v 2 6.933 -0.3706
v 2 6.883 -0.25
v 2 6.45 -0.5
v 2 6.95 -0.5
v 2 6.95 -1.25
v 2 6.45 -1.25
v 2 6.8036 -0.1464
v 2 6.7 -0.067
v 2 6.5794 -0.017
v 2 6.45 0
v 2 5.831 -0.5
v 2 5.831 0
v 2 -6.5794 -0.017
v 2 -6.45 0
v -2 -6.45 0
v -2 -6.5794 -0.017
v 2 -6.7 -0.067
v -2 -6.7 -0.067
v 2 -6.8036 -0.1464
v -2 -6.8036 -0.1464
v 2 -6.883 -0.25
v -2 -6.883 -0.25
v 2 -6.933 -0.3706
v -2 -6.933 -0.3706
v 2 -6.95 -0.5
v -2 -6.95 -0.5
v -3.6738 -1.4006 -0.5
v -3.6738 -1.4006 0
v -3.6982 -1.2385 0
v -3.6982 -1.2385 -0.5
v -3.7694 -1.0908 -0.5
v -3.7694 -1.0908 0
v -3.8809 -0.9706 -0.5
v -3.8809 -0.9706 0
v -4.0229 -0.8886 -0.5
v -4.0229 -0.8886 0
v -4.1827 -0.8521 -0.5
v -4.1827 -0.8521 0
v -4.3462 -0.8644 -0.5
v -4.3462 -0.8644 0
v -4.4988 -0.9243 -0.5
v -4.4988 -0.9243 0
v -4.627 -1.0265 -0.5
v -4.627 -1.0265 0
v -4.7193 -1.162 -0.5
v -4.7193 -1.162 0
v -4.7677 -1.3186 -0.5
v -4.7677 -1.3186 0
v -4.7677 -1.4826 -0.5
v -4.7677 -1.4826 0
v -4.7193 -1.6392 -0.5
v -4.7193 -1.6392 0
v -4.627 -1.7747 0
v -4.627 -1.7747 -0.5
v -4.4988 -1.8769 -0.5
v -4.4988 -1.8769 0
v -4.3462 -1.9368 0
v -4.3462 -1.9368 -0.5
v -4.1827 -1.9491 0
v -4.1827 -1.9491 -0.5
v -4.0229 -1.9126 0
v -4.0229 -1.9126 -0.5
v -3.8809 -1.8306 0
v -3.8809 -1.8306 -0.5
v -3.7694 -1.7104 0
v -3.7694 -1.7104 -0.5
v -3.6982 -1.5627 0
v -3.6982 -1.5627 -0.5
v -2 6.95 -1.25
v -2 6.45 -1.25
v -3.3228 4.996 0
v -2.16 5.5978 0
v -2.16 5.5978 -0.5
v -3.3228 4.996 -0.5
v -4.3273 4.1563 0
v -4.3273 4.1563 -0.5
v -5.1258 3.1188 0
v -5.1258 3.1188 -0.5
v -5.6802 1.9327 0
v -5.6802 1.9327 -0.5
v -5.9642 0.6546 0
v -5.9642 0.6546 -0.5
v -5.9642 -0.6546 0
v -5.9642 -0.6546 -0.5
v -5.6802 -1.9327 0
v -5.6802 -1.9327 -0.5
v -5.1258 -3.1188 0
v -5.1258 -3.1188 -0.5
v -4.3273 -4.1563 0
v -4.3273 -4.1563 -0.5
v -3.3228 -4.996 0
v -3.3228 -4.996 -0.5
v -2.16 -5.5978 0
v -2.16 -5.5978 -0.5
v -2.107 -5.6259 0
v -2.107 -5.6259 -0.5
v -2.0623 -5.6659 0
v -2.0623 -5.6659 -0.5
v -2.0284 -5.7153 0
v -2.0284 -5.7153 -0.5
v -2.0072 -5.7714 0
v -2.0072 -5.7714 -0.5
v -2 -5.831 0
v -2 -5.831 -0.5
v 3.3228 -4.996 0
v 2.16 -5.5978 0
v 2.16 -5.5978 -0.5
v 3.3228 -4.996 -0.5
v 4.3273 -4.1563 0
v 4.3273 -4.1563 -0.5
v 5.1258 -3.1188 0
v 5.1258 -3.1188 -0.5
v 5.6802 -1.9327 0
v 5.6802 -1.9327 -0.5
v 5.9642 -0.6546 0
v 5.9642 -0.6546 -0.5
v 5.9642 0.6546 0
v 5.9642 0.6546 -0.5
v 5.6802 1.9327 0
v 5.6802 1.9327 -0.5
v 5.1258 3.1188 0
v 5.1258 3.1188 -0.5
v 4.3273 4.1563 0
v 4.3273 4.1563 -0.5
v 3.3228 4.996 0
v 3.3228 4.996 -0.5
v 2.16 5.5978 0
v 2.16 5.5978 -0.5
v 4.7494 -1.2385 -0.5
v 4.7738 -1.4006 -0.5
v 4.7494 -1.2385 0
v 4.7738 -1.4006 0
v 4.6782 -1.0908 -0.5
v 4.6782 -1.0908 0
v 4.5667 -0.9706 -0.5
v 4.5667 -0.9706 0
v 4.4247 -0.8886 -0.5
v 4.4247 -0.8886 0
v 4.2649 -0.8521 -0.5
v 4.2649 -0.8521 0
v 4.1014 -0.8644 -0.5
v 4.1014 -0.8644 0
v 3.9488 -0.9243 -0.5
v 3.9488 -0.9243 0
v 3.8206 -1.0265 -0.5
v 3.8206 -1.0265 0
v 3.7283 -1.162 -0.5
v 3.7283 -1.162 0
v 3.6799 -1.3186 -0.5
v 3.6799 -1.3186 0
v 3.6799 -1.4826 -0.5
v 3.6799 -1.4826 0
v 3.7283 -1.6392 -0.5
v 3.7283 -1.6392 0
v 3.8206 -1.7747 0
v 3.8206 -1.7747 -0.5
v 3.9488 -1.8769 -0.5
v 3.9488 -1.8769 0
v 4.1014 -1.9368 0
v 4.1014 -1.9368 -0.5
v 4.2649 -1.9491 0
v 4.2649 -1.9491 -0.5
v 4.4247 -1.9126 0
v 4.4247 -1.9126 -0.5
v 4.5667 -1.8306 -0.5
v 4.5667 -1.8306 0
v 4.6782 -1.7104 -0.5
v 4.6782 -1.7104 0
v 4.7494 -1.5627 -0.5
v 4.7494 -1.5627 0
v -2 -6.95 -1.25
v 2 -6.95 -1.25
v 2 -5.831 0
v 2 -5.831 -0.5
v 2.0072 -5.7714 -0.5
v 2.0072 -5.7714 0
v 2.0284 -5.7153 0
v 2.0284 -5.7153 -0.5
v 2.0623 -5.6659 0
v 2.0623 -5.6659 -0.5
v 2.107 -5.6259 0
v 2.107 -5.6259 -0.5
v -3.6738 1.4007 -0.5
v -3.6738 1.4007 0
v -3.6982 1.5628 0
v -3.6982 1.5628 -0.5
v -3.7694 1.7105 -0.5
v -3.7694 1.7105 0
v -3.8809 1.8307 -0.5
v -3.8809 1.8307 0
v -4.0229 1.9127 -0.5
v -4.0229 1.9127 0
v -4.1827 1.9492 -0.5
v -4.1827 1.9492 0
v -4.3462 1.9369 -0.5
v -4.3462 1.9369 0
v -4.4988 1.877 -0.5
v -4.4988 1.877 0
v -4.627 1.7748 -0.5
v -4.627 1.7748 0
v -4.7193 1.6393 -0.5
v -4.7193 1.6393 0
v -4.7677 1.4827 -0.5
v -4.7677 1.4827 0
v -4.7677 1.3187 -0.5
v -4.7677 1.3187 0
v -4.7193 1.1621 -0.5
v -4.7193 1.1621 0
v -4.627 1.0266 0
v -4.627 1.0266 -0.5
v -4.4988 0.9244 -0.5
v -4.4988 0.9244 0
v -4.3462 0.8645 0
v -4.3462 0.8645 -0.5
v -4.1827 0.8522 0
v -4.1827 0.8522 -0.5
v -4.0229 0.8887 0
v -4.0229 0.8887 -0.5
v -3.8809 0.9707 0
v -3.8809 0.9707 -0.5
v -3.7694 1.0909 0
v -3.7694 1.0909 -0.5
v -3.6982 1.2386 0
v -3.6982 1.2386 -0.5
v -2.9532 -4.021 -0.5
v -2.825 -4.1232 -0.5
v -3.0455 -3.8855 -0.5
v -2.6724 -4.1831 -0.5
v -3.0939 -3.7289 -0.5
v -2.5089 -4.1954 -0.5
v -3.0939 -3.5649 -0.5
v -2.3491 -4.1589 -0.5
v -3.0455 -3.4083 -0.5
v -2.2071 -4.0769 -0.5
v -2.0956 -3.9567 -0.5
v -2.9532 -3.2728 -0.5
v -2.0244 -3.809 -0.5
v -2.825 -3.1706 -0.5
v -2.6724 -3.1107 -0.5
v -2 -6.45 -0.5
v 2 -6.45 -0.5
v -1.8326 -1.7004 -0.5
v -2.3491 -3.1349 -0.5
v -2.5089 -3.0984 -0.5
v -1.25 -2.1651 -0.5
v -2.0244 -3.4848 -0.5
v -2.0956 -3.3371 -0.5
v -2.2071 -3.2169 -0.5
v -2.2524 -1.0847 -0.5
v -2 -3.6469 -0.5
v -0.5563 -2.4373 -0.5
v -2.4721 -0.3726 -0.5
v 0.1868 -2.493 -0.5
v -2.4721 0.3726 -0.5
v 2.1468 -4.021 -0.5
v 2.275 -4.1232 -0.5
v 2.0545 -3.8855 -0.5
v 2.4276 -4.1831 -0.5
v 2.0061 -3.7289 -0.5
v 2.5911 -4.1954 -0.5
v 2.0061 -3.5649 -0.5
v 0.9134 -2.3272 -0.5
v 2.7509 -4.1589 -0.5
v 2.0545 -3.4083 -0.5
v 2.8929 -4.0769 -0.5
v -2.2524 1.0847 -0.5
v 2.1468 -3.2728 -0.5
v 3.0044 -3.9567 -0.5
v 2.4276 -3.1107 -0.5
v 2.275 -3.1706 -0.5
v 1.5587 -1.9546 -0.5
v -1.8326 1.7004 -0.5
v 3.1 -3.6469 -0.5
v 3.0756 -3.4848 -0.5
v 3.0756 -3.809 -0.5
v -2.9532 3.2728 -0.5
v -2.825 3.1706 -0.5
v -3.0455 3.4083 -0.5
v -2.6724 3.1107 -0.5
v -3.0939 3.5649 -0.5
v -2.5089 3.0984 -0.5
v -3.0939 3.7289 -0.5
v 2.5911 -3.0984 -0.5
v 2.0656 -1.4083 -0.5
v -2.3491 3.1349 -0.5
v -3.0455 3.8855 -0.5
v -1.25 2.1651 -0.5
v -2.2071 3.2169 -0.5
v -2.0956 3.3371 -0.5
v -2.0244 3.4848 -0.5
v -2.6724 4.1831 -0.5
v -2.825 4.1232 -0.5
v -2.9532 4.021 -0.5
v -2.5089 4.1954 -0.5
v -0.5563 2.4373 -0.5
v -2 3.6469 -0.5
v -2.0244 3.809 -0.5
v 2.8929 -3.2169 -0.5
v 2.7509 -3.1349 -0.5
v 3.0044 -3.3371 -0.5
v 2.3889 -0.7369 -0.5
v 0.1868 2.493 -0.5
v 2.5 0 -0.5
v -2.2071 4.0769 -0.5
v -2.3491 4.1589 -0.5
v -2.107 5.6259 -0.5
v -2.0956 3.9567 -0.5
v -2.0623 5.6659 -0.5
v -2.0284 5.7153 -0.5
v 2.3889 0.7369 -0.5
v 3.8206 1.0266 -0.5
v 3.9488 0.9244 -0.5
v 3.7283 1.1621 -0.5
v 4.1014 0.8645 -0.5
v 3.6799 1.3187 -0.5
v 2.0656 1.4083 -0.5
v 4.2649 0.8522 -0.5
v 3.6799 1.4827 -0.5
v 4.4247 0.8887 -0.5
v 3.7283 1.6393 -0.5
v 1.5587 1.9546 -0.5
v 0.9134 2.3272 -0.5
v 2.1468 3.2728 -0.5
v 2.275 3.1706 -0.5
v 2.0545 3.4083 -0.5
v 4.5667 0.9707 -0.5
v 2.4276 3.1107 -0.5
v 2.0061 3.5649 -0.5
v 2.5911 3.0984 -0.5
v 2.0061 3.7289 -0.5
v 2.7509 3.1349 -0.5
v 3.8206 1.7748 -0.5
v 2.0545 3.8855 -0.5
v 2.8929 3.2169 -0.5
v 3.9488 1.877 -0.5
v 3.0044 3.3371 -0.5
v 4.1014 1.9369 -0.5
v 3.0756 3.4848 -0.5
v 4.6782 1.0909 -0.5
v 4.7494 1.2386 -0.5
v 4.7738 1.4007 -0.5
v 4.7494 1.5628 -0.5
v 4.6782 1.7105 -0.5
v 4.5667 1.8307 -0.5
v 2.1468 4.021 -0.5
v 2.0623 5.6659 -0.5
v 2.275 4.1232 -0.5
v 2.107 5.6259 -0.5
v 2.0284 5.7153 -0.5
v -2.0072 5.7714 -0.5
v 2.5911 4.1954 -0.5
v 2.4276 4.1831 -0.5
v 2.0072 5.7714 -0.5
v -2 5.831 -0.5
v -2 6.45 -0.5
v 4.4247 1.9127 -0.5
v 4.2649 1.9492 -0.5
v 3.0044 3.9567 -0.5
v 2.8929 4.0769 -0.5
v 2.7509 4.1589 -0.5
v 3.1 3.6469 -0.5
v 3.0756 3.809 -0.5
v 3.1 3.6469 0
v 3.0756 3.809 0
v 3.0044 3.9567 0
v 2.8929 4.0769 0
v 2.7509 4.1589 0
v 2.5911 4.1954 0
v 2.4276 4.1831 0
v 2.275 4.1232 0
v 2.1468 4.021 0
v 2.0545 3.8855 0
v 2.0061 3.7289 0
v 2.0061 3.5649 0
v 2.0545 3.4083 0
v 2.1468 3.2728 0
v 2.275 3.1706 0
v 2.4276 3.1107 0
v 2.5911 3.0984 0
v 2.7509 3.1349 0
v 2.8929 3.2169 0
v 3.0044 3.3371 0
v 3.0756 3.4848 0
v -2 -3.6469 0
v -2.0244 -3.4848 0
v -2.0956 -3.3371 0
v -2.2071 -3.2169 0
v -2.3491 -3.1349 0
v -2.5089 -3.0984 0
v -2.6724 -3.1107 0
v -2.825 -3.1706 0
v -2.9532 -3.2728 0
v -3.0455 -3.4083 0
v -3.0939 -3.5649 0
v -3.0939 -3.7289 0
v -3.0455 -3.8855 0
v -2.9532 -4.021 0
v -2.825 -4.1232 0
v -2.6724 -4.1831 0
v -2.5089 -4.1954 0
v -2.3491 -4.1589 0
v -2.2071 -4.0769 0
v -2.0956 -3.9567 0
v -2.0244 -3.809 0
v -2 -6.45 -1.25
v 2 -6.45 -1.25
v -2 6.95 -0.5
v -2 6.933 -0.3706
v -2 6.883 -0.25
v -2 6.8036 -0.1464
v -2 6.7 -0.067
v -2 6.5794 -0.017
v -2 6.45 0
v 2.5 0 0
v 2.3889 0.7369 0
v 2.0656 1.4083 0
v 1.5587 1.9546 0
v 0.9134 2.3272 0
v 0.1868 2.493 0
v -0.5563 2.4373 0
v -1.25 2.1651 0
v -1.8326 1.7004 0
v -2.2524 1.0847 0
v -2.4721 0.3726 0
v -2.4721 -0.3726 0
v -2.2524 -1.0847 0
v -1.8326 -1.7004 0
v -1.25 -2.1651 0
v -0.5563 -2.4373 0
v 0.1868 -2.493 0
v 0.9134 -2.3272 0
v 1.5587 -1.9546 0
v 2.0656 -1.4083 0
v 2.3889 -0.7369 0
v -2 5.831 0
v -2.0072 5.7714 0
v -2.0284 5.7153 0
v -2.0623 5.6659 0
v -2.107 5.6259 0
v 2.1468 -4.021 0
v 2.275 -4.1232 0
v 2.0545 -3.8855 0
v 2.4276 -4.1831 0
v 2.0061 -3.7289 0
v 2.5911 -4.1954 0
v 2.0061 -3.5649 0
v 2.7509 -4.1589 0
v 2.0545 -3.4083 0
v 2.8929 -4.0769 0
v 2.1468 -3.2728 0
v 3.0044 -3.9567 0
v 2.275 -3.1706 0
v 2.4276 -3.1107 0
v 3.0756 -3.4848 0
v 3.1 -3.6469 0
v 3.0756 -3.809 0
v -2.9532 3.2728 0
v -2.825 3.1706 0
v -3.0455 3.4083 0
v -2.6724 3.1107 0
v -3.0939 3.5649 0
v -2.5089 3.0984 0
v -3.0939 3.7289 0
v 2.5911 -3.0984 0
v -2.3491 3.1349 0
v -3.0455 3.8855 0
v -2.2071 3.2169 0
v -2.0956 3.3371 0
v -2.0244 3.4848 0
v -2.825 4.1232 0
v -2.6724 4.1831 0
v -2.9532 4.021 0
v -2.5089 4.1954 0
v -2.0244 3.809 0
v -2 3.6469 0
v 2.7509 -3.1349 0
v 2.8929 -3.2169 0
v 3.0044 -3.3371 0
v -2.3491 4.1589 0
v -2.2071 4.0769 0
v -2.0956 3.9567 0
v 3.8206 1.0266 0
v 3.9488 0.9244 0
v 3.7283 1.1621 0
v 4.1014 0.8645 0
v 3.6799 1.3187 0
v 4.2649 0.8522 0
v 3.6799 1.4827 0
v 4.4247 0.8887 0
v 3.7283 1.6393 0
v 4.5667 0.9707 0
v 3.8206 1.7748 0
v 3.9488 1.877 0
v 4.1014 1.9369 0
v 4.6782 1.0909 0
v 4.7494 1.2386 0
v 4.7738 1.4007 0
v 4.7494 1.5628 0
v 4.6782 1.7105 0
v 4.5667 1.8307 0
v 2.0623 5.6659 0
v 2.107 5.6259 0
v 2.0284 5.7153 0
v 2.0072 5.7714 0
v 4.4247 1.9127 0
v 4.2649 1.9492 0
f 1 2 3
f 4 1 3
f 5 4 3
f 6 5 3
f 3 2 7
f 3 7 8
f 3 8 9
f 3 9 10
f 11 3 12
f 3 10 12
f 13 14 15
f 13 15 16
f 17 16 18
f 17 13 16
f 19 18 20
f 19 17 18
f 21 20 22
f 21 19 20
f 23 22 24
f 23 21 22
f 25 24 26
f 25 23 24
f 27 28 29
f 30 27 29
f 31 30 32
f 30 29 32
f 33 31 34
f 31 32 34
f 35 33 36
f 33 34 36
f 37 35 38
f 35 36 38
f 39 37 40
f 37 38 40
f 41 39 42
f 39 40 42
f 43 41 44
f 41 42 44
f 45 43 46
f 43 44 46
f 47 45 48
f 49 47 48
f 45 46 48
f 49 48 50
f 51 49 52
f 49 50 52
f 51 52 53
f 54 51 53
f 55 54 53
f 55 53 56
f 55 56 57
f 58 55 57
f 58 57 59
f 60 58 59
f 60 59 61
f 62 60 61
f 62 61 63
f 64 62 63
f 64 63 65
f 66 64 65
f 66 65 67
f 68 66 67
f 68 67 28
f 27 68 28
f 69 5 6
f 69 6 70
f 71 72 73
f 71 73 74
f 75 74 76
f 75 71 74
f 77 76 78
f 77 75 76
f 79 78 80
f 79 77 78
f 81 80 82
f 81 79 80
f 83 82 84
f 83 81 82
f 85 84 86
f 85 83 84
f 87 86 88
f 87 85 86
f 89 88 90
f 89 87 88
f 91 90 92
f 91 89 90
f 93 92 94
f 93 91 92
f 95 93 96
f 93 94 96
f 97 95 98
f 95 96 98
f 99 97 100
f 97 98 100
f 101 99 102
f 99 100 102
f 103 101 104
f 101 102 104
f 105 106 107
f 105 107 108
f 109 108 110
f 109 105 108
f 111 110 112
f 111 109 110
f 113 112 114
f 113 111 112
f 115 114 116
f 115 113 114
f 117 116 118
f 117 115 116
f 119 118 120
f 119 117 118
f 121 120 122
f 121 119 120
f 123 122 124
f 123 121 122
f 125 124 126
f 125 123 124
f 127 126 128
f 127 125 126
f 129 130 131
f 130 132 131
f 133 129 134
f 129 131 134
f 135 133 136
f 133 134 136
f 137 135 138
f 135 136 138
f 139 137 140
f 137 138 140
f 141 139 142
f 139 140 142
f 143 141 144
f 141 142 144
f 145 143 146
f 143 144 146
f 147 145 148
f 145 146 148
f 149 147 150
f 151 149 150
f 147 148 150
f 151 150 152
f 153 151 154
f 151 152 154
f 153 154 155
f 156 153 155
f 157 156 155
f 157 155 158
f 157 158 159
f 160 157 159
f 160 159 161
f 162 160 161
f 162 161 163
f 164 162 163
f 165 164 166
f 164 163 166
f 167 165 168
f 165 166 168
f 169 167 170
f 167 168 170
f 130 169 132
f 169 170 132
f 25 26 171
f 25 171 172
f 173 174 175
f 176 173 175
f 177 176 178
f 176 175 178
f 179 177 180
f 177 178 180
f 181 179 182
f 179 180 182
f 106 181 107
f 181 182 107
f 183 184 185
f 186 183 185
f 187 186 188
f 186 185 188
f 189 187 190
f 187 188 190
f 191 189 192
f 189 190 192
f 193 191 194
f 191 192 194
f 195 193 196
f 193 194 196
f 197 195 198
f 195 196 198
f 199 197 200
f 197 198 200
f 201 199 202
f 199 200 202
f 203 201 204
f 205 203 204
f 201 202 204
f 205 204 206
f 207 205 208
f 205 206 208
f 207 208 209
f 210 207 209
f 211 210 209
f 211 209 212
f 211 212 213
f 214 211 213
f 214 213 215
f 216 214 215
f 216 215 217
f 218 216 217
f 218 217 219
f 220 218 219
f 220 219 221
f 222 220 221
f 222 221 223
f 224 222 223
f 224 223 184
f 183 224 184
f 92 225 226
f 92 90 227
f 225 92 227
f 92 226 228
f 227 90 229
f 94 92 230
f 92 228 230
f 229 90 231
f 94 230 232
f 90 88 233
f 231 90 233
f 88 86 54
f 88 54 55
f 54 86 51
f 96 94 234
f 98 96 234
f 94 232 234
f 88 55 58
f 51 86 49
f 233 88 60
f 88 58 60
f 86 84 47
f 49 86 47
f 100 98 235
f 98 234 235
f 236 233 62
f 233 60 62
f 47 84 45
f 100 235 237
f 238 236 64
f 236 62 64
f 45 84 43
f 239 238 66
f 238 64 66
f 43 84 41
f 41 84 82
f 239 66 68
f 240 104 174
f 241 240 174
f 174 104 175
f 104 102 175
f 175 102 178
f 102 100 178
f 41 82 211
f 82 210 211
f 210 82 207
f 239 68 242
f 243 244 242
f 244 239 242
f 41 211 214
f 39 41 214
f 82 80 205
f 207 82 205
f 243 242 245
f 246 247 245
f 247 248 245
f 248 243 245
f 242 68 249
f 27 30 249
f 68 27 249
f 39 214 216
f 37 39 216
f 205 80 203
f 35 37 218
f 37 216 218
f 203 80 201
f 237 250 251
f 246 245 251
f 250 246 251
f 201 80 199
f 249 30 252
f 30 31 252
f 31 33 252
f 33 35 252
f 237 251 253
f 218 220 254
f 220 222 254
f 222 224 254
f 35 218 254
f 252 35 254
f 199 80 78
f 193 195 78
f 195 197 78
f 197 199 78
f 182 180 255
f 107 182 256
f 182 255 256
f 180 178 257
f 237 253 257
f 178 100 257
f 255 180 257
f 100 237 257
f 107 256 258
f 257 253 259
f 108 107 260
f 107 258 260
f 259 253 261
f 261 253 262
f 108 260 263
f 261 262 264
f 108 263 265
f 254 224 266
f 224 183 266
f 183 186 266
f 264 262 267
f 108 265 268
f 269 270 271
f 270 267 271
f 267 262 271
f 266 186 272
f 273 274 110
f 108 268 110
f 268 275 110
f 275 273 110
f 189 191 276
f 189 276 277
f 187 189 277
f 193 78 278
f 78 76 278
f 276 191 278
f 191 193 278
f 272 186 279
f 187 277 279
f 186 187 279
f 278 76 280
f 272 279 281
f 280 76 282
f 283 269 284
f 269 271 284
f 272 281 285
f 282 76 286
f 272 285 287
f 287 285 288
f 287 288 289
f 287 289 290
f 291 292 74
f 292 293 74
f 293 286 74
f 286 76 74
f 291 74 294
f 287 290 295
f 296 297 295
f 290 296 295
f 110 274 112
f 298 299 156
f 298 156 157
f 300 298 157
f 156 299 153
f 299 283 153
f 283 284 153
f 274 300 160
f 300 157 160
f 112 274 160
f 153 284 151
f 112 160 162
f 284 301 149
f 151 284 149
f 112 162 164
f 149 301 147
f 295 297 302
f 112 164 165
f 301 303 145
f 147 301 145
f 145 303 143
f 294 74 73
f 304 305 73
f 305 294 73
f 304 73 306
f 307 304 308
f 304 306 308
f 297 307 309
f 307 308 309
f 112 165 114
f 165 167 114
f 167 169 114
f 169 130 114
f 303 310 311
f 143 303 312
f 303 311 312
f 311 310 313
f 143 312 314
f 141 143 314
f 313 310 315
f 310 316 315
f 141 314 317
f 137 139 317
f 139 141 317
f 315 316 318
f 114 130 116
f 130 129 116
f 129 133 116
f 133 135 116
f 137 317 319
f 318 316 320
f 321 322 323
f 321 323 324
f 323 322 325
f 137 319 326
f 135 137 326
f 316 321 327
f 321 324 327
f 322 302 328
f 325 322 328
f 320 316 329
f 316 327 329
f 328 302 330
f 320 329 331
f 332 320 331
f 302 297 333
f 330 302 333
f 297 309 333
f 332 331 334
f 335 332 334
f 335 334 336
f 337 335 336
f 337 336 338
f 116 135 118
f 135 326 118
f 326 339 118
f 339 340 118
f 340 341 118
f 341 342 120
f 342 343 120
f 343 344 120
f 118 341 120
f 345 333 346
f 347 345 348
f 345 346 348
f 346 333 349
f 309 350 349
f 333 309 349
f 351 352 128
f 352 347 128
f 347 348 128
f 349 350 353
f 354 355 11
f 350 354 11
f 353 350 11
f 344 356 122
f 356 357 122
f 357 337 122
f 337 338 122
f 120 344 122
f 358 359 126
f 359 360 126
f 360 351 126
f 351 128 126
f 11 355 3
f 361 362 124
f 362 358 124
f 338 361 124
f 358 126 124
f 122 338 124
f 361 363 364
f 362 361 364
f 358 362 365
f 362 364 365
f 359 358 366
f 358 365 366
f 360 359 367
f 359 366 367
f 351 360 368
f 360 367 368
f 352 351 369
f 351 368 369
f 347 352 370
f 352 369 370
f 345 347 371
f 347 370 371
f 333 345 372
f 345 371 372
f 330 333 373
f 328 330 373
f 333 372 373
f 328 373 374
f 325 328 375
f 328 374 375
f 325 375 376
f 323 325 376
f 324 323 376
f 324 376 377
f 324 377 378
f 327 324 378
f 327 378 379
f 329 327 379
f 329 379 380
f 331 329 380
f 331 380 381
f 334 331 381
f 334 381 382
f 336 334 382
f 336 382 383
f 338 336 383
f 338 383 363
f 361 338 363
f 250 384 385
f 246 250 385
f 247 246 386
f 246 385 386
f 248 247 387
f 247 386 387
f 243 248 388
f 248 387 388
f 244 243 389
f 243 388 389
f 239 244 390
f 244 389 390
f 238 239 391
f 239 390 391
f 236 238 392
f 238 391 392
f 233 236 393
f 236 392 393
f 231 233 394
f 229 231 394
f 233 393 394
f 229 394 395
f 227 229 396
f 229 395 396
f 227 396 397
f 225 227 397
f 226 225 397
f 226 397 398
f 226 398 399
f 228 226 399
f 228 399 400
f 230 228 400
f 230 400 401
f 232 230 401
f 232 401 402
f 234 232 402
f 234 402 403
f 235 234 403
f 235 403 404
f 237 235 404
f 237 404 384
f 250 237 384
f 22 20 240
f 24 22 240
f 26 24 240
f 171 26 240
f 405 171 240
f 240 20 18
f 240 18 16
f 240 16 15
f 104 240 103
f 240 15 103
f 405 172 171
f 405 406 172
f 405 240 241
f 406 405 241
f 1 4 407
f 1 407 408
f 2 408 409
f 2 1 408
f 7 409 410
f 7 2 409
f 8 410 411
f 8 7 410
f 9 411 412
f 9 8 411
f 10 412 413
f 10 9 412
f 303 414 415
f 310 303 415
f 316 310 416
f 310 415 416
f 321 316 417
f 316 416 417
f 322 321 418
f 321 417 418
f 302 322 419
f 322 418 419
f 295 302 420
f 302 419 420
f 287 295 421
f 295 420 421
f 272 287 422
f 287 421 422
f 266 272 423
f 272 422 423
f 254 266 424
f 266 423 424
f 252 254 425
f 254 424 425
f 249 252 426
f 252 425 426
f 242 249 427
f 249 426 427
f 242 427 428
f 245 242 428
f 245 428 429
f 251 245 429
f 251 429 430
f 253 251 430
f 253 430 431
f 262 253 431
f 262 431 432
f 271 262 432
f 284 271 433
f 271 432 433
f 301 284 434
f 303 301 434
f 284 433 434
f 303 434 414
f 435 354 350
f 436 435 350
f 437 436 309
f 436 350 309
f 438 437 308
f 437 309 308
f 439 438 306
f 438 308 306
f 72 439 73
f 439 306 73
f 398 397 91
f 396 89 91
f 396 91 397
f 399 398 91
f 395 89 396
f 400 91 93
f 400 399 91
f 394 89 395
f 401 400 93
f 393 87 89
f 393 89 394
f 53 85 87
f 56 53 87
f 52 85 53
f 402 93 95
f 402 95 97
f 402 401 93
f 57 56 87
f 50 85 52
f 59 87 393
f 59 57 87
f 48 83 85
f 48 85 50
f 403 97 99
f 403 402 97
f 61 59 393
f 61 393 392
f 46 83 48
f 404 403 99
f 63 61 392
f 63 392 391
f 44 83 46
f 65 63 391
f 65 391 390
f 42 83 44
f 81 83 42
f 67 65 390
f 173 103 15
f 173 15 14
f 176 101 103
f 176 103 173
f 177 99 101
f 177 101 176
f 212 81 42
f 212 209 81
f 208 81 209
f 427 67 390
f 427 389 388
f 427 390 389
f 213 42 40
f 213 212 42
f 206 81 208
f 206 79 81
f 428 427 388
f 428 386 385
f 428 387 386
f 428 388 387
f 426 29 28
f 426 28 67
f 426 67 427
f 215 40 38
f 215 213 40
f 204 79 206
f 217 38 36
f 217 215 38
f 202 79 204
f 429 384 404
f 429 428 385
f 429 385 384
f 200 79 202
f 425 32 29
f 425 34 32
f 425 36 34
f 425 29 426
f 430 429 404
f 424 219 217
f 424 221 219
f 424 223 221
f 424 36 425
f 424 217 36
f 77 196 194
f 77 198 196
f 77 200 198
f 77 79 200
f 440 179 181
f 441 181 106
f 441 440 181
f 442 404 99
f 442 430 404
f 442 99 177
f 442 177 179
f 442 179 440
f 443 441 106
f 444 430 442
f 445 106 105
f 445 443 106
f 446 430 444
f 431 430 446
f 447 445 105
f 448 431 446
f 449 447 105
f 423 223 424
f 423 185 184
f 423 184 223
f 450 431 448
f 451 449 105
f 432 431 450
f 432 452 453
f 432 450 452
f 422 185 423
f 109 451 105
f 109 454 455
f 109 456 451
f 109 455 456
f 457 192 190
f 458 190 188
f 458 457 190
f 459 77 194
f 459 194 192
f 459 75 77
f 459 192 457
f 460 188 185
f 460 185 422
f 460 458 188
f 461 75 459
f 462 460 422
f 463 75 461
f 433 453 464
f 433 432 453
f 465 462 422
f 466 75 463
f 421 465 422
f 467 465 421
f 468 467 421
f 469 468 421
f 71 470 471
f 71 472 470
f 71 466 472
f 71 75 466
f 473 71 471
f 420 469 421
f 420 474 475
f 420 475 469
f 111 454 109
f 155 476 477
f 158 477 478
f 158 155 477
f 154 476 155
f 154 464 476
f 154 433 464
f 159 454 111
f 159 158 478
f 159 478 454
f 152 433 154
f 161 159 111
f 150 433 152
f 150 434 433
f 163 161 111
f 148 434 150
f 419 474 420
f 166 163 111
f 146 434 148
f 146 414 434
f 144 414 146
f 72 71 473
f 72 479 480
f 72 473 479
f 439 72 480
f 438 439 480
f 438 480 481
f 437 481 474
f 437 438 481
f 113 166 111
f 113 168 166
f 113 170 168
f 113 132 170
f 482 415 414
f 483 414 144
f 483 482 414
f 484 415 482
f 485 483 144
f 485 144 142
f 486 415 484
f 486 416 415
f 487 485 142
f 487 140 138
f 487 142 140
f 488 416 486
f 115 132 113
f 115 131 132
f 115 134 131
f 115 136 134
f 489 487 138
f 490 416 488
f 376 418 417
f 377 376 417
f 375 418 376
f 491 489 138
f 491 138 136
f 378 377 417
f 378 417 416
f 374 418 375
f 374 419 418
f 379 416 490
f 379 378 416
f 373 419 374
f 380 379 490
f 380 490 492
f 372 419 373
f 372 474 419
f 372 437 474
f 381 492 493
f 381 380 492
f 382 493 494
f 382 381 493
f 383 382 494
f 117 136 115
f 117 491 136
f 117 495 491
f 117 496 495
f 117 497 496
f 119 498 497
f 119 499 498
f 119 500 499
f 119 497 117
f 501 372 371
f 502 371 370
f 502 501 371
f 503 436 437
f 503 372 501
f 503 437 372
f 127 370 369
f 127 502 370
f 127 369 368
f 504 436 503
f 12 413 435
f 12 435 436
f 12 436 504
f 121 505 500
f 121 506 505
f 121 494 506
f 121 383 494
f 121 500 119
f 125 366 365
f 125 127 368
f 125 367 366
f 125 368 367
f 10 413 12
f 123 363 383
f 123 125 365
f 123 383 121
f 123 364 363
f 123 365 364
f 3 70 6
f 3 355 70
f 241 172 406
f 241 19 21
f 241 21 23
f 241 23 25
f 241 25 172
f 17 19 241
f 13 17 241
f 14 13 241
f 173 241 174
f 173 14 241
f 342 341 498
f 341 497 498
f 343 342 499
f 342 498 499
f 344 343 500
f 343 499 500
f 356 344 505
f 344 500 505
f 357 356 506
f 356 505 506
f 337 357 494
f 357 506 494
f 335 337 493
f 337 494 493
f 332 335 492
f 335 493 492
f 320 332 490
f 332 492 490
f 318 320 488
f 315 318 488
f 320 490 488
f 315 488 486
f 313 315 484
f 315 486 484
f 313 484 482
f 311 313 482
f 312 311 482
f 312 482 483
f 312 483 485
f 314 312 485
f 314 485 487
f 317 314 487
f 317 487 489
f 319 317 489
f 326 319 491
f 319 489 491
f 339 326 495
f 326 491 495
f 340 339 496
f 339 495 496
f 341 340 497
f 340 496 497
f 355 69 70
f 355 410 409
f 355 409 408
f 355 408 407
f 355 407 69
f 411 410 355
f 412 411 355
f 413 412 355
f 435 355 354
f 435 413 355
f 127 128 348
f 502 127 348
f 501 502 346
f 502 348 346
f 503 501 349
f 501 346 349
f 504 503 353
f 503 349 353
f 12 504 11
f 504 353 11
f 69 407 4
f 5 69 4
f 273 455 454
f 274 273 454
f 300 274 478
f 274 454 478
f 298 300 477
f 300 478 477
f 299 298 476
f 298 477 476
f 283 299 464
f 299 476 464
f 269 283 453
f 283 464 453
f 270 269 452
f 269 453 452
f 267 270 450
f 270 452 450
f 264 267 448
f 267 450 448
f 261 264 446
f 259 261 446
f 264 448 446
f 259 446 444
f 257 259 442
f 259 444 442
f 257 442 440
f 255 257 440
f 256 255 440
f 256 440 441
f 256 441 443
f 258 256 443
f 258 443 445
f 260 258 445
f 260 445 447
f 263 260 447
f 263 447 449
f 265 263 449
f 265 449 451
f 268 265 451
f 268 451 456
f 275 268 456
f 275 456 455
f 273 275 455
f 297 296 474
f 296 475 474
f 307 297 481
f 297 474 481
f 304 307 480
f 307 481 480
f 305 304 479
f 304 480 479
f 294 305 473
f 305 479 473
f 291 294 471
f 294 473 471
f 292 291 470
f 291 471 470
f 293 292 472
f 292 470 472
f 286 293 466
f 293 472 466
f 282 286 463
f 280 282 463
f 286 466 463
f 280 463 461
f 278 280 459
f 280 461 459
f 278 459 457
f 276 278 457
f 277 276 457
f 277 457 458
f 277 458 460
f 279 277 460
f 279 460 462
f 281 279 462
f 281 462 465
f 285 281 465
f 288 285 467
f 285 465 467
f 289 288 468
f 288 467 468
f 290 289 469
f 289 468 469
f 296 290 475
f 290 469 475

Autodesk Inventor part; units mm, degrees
ref_plane "YZ Plane" through (0, 0, 0) normal (1, 0, 0) x (0, 1, 0)
ref_plane "XZ Plane" through (0, 0, 0) normal (0, 1, 0) x (-1, 0, 0)
ref_plane "XY Plane" through (0, 0, 0) normal (0, 0, 1) x (1, 0, 0)
sketch "Szkic1" plane through (0, 0, 0) normal (0, 0, 1) x (1, 0, 0)
  circle A0 centre (0, 0) radius 2.5
  line L0 (-2, 6.95) -> (2, 6.95)
  line L1 (-2, -6.95) -> (2, -6.95)
  line L2 (-2, 6.95) -> (-2, 5.6569)
  line L3 (2, 6.95) -> (2, 5.6569)
  line L4 (-2, -6.95) -> (-2, -5.6569)
  line L5 (2, -6.95) -> (2, -5.6569)
  arc A1 (-2, 5.6569) -> (-2, -5.6569) centre (0, 0) ccw
  arc A2 (2, -5.6569) -> (2, 5.6569) centre (0, 0) ccw
  circle A3 centre (2.55, 3.6469) radius 0.55
  circle A4 centre (4.2238, 1.4007) radius 0.55
  circle A5 centre (4.2238, -1.4006) radius 0.55
  circle A6 centre (2.55, -3.6469) radius 0.55
  circle A7 centre (-2.55, 3.6469) radius 0.55
  circle A8 centre (-4.2238, 1.4007) radius 0.55
  circle A9 centre (-4.2238, -1.4006) radius 0.55
  circle A10 centre (-2.55, -3.6469) radius 0.55
  dimension "d4" = 4
  dimension "d5" = 4
  dimension "d25" = 110.076
extrude "Wyciągnięcie proste3" add sketch "Szkic1" against normal blind 0.5
sketch "Szkic3" plane through (0, 0, -0.5) normal (0, 0, -1) x (-1, 0, 0)
  line L0 (2, 6.95) -> (-2, 6.95) projected
  line L1 (-2, 6.95) -> (2, 6.95)
  line L2 (2, 6.95) -> (2, 6.45)
  line L3 (2, 6.45) -> (-2, 6.45)
  line L4 (-2, 6.45) -> (-2, 6.95)
  line L5 (-2, -6.95) -> (2, -6.95) projected
  line L6 (-2, -6.95) -> (2, -6.95)
  line L7 (2, -6.95) -> (2, -6.45)
  line L8 (2, -6.45) -> (-2, -6.45)
  line L9 (-2, -6.45) -> (-2, -6.95)
extrude "Wyciągnięcie proste4" add sketch "Szkic3" along normal blind 0.75
fillet "Zaokrąglenie3" radius 0.25 4 edges at (-2, 5.6569, -0.25) (2, 5.6569, -0.25) (2, -5.6569, -0.25) (-2, -5.6569, -0.25)
fillet "Zaokrąglenie4" radius 0.5 2 edges at (0, -6.95, 0) (0, 6.95, 0)
properties part number "SŁONECZKO MAŁE" material "Stal"
